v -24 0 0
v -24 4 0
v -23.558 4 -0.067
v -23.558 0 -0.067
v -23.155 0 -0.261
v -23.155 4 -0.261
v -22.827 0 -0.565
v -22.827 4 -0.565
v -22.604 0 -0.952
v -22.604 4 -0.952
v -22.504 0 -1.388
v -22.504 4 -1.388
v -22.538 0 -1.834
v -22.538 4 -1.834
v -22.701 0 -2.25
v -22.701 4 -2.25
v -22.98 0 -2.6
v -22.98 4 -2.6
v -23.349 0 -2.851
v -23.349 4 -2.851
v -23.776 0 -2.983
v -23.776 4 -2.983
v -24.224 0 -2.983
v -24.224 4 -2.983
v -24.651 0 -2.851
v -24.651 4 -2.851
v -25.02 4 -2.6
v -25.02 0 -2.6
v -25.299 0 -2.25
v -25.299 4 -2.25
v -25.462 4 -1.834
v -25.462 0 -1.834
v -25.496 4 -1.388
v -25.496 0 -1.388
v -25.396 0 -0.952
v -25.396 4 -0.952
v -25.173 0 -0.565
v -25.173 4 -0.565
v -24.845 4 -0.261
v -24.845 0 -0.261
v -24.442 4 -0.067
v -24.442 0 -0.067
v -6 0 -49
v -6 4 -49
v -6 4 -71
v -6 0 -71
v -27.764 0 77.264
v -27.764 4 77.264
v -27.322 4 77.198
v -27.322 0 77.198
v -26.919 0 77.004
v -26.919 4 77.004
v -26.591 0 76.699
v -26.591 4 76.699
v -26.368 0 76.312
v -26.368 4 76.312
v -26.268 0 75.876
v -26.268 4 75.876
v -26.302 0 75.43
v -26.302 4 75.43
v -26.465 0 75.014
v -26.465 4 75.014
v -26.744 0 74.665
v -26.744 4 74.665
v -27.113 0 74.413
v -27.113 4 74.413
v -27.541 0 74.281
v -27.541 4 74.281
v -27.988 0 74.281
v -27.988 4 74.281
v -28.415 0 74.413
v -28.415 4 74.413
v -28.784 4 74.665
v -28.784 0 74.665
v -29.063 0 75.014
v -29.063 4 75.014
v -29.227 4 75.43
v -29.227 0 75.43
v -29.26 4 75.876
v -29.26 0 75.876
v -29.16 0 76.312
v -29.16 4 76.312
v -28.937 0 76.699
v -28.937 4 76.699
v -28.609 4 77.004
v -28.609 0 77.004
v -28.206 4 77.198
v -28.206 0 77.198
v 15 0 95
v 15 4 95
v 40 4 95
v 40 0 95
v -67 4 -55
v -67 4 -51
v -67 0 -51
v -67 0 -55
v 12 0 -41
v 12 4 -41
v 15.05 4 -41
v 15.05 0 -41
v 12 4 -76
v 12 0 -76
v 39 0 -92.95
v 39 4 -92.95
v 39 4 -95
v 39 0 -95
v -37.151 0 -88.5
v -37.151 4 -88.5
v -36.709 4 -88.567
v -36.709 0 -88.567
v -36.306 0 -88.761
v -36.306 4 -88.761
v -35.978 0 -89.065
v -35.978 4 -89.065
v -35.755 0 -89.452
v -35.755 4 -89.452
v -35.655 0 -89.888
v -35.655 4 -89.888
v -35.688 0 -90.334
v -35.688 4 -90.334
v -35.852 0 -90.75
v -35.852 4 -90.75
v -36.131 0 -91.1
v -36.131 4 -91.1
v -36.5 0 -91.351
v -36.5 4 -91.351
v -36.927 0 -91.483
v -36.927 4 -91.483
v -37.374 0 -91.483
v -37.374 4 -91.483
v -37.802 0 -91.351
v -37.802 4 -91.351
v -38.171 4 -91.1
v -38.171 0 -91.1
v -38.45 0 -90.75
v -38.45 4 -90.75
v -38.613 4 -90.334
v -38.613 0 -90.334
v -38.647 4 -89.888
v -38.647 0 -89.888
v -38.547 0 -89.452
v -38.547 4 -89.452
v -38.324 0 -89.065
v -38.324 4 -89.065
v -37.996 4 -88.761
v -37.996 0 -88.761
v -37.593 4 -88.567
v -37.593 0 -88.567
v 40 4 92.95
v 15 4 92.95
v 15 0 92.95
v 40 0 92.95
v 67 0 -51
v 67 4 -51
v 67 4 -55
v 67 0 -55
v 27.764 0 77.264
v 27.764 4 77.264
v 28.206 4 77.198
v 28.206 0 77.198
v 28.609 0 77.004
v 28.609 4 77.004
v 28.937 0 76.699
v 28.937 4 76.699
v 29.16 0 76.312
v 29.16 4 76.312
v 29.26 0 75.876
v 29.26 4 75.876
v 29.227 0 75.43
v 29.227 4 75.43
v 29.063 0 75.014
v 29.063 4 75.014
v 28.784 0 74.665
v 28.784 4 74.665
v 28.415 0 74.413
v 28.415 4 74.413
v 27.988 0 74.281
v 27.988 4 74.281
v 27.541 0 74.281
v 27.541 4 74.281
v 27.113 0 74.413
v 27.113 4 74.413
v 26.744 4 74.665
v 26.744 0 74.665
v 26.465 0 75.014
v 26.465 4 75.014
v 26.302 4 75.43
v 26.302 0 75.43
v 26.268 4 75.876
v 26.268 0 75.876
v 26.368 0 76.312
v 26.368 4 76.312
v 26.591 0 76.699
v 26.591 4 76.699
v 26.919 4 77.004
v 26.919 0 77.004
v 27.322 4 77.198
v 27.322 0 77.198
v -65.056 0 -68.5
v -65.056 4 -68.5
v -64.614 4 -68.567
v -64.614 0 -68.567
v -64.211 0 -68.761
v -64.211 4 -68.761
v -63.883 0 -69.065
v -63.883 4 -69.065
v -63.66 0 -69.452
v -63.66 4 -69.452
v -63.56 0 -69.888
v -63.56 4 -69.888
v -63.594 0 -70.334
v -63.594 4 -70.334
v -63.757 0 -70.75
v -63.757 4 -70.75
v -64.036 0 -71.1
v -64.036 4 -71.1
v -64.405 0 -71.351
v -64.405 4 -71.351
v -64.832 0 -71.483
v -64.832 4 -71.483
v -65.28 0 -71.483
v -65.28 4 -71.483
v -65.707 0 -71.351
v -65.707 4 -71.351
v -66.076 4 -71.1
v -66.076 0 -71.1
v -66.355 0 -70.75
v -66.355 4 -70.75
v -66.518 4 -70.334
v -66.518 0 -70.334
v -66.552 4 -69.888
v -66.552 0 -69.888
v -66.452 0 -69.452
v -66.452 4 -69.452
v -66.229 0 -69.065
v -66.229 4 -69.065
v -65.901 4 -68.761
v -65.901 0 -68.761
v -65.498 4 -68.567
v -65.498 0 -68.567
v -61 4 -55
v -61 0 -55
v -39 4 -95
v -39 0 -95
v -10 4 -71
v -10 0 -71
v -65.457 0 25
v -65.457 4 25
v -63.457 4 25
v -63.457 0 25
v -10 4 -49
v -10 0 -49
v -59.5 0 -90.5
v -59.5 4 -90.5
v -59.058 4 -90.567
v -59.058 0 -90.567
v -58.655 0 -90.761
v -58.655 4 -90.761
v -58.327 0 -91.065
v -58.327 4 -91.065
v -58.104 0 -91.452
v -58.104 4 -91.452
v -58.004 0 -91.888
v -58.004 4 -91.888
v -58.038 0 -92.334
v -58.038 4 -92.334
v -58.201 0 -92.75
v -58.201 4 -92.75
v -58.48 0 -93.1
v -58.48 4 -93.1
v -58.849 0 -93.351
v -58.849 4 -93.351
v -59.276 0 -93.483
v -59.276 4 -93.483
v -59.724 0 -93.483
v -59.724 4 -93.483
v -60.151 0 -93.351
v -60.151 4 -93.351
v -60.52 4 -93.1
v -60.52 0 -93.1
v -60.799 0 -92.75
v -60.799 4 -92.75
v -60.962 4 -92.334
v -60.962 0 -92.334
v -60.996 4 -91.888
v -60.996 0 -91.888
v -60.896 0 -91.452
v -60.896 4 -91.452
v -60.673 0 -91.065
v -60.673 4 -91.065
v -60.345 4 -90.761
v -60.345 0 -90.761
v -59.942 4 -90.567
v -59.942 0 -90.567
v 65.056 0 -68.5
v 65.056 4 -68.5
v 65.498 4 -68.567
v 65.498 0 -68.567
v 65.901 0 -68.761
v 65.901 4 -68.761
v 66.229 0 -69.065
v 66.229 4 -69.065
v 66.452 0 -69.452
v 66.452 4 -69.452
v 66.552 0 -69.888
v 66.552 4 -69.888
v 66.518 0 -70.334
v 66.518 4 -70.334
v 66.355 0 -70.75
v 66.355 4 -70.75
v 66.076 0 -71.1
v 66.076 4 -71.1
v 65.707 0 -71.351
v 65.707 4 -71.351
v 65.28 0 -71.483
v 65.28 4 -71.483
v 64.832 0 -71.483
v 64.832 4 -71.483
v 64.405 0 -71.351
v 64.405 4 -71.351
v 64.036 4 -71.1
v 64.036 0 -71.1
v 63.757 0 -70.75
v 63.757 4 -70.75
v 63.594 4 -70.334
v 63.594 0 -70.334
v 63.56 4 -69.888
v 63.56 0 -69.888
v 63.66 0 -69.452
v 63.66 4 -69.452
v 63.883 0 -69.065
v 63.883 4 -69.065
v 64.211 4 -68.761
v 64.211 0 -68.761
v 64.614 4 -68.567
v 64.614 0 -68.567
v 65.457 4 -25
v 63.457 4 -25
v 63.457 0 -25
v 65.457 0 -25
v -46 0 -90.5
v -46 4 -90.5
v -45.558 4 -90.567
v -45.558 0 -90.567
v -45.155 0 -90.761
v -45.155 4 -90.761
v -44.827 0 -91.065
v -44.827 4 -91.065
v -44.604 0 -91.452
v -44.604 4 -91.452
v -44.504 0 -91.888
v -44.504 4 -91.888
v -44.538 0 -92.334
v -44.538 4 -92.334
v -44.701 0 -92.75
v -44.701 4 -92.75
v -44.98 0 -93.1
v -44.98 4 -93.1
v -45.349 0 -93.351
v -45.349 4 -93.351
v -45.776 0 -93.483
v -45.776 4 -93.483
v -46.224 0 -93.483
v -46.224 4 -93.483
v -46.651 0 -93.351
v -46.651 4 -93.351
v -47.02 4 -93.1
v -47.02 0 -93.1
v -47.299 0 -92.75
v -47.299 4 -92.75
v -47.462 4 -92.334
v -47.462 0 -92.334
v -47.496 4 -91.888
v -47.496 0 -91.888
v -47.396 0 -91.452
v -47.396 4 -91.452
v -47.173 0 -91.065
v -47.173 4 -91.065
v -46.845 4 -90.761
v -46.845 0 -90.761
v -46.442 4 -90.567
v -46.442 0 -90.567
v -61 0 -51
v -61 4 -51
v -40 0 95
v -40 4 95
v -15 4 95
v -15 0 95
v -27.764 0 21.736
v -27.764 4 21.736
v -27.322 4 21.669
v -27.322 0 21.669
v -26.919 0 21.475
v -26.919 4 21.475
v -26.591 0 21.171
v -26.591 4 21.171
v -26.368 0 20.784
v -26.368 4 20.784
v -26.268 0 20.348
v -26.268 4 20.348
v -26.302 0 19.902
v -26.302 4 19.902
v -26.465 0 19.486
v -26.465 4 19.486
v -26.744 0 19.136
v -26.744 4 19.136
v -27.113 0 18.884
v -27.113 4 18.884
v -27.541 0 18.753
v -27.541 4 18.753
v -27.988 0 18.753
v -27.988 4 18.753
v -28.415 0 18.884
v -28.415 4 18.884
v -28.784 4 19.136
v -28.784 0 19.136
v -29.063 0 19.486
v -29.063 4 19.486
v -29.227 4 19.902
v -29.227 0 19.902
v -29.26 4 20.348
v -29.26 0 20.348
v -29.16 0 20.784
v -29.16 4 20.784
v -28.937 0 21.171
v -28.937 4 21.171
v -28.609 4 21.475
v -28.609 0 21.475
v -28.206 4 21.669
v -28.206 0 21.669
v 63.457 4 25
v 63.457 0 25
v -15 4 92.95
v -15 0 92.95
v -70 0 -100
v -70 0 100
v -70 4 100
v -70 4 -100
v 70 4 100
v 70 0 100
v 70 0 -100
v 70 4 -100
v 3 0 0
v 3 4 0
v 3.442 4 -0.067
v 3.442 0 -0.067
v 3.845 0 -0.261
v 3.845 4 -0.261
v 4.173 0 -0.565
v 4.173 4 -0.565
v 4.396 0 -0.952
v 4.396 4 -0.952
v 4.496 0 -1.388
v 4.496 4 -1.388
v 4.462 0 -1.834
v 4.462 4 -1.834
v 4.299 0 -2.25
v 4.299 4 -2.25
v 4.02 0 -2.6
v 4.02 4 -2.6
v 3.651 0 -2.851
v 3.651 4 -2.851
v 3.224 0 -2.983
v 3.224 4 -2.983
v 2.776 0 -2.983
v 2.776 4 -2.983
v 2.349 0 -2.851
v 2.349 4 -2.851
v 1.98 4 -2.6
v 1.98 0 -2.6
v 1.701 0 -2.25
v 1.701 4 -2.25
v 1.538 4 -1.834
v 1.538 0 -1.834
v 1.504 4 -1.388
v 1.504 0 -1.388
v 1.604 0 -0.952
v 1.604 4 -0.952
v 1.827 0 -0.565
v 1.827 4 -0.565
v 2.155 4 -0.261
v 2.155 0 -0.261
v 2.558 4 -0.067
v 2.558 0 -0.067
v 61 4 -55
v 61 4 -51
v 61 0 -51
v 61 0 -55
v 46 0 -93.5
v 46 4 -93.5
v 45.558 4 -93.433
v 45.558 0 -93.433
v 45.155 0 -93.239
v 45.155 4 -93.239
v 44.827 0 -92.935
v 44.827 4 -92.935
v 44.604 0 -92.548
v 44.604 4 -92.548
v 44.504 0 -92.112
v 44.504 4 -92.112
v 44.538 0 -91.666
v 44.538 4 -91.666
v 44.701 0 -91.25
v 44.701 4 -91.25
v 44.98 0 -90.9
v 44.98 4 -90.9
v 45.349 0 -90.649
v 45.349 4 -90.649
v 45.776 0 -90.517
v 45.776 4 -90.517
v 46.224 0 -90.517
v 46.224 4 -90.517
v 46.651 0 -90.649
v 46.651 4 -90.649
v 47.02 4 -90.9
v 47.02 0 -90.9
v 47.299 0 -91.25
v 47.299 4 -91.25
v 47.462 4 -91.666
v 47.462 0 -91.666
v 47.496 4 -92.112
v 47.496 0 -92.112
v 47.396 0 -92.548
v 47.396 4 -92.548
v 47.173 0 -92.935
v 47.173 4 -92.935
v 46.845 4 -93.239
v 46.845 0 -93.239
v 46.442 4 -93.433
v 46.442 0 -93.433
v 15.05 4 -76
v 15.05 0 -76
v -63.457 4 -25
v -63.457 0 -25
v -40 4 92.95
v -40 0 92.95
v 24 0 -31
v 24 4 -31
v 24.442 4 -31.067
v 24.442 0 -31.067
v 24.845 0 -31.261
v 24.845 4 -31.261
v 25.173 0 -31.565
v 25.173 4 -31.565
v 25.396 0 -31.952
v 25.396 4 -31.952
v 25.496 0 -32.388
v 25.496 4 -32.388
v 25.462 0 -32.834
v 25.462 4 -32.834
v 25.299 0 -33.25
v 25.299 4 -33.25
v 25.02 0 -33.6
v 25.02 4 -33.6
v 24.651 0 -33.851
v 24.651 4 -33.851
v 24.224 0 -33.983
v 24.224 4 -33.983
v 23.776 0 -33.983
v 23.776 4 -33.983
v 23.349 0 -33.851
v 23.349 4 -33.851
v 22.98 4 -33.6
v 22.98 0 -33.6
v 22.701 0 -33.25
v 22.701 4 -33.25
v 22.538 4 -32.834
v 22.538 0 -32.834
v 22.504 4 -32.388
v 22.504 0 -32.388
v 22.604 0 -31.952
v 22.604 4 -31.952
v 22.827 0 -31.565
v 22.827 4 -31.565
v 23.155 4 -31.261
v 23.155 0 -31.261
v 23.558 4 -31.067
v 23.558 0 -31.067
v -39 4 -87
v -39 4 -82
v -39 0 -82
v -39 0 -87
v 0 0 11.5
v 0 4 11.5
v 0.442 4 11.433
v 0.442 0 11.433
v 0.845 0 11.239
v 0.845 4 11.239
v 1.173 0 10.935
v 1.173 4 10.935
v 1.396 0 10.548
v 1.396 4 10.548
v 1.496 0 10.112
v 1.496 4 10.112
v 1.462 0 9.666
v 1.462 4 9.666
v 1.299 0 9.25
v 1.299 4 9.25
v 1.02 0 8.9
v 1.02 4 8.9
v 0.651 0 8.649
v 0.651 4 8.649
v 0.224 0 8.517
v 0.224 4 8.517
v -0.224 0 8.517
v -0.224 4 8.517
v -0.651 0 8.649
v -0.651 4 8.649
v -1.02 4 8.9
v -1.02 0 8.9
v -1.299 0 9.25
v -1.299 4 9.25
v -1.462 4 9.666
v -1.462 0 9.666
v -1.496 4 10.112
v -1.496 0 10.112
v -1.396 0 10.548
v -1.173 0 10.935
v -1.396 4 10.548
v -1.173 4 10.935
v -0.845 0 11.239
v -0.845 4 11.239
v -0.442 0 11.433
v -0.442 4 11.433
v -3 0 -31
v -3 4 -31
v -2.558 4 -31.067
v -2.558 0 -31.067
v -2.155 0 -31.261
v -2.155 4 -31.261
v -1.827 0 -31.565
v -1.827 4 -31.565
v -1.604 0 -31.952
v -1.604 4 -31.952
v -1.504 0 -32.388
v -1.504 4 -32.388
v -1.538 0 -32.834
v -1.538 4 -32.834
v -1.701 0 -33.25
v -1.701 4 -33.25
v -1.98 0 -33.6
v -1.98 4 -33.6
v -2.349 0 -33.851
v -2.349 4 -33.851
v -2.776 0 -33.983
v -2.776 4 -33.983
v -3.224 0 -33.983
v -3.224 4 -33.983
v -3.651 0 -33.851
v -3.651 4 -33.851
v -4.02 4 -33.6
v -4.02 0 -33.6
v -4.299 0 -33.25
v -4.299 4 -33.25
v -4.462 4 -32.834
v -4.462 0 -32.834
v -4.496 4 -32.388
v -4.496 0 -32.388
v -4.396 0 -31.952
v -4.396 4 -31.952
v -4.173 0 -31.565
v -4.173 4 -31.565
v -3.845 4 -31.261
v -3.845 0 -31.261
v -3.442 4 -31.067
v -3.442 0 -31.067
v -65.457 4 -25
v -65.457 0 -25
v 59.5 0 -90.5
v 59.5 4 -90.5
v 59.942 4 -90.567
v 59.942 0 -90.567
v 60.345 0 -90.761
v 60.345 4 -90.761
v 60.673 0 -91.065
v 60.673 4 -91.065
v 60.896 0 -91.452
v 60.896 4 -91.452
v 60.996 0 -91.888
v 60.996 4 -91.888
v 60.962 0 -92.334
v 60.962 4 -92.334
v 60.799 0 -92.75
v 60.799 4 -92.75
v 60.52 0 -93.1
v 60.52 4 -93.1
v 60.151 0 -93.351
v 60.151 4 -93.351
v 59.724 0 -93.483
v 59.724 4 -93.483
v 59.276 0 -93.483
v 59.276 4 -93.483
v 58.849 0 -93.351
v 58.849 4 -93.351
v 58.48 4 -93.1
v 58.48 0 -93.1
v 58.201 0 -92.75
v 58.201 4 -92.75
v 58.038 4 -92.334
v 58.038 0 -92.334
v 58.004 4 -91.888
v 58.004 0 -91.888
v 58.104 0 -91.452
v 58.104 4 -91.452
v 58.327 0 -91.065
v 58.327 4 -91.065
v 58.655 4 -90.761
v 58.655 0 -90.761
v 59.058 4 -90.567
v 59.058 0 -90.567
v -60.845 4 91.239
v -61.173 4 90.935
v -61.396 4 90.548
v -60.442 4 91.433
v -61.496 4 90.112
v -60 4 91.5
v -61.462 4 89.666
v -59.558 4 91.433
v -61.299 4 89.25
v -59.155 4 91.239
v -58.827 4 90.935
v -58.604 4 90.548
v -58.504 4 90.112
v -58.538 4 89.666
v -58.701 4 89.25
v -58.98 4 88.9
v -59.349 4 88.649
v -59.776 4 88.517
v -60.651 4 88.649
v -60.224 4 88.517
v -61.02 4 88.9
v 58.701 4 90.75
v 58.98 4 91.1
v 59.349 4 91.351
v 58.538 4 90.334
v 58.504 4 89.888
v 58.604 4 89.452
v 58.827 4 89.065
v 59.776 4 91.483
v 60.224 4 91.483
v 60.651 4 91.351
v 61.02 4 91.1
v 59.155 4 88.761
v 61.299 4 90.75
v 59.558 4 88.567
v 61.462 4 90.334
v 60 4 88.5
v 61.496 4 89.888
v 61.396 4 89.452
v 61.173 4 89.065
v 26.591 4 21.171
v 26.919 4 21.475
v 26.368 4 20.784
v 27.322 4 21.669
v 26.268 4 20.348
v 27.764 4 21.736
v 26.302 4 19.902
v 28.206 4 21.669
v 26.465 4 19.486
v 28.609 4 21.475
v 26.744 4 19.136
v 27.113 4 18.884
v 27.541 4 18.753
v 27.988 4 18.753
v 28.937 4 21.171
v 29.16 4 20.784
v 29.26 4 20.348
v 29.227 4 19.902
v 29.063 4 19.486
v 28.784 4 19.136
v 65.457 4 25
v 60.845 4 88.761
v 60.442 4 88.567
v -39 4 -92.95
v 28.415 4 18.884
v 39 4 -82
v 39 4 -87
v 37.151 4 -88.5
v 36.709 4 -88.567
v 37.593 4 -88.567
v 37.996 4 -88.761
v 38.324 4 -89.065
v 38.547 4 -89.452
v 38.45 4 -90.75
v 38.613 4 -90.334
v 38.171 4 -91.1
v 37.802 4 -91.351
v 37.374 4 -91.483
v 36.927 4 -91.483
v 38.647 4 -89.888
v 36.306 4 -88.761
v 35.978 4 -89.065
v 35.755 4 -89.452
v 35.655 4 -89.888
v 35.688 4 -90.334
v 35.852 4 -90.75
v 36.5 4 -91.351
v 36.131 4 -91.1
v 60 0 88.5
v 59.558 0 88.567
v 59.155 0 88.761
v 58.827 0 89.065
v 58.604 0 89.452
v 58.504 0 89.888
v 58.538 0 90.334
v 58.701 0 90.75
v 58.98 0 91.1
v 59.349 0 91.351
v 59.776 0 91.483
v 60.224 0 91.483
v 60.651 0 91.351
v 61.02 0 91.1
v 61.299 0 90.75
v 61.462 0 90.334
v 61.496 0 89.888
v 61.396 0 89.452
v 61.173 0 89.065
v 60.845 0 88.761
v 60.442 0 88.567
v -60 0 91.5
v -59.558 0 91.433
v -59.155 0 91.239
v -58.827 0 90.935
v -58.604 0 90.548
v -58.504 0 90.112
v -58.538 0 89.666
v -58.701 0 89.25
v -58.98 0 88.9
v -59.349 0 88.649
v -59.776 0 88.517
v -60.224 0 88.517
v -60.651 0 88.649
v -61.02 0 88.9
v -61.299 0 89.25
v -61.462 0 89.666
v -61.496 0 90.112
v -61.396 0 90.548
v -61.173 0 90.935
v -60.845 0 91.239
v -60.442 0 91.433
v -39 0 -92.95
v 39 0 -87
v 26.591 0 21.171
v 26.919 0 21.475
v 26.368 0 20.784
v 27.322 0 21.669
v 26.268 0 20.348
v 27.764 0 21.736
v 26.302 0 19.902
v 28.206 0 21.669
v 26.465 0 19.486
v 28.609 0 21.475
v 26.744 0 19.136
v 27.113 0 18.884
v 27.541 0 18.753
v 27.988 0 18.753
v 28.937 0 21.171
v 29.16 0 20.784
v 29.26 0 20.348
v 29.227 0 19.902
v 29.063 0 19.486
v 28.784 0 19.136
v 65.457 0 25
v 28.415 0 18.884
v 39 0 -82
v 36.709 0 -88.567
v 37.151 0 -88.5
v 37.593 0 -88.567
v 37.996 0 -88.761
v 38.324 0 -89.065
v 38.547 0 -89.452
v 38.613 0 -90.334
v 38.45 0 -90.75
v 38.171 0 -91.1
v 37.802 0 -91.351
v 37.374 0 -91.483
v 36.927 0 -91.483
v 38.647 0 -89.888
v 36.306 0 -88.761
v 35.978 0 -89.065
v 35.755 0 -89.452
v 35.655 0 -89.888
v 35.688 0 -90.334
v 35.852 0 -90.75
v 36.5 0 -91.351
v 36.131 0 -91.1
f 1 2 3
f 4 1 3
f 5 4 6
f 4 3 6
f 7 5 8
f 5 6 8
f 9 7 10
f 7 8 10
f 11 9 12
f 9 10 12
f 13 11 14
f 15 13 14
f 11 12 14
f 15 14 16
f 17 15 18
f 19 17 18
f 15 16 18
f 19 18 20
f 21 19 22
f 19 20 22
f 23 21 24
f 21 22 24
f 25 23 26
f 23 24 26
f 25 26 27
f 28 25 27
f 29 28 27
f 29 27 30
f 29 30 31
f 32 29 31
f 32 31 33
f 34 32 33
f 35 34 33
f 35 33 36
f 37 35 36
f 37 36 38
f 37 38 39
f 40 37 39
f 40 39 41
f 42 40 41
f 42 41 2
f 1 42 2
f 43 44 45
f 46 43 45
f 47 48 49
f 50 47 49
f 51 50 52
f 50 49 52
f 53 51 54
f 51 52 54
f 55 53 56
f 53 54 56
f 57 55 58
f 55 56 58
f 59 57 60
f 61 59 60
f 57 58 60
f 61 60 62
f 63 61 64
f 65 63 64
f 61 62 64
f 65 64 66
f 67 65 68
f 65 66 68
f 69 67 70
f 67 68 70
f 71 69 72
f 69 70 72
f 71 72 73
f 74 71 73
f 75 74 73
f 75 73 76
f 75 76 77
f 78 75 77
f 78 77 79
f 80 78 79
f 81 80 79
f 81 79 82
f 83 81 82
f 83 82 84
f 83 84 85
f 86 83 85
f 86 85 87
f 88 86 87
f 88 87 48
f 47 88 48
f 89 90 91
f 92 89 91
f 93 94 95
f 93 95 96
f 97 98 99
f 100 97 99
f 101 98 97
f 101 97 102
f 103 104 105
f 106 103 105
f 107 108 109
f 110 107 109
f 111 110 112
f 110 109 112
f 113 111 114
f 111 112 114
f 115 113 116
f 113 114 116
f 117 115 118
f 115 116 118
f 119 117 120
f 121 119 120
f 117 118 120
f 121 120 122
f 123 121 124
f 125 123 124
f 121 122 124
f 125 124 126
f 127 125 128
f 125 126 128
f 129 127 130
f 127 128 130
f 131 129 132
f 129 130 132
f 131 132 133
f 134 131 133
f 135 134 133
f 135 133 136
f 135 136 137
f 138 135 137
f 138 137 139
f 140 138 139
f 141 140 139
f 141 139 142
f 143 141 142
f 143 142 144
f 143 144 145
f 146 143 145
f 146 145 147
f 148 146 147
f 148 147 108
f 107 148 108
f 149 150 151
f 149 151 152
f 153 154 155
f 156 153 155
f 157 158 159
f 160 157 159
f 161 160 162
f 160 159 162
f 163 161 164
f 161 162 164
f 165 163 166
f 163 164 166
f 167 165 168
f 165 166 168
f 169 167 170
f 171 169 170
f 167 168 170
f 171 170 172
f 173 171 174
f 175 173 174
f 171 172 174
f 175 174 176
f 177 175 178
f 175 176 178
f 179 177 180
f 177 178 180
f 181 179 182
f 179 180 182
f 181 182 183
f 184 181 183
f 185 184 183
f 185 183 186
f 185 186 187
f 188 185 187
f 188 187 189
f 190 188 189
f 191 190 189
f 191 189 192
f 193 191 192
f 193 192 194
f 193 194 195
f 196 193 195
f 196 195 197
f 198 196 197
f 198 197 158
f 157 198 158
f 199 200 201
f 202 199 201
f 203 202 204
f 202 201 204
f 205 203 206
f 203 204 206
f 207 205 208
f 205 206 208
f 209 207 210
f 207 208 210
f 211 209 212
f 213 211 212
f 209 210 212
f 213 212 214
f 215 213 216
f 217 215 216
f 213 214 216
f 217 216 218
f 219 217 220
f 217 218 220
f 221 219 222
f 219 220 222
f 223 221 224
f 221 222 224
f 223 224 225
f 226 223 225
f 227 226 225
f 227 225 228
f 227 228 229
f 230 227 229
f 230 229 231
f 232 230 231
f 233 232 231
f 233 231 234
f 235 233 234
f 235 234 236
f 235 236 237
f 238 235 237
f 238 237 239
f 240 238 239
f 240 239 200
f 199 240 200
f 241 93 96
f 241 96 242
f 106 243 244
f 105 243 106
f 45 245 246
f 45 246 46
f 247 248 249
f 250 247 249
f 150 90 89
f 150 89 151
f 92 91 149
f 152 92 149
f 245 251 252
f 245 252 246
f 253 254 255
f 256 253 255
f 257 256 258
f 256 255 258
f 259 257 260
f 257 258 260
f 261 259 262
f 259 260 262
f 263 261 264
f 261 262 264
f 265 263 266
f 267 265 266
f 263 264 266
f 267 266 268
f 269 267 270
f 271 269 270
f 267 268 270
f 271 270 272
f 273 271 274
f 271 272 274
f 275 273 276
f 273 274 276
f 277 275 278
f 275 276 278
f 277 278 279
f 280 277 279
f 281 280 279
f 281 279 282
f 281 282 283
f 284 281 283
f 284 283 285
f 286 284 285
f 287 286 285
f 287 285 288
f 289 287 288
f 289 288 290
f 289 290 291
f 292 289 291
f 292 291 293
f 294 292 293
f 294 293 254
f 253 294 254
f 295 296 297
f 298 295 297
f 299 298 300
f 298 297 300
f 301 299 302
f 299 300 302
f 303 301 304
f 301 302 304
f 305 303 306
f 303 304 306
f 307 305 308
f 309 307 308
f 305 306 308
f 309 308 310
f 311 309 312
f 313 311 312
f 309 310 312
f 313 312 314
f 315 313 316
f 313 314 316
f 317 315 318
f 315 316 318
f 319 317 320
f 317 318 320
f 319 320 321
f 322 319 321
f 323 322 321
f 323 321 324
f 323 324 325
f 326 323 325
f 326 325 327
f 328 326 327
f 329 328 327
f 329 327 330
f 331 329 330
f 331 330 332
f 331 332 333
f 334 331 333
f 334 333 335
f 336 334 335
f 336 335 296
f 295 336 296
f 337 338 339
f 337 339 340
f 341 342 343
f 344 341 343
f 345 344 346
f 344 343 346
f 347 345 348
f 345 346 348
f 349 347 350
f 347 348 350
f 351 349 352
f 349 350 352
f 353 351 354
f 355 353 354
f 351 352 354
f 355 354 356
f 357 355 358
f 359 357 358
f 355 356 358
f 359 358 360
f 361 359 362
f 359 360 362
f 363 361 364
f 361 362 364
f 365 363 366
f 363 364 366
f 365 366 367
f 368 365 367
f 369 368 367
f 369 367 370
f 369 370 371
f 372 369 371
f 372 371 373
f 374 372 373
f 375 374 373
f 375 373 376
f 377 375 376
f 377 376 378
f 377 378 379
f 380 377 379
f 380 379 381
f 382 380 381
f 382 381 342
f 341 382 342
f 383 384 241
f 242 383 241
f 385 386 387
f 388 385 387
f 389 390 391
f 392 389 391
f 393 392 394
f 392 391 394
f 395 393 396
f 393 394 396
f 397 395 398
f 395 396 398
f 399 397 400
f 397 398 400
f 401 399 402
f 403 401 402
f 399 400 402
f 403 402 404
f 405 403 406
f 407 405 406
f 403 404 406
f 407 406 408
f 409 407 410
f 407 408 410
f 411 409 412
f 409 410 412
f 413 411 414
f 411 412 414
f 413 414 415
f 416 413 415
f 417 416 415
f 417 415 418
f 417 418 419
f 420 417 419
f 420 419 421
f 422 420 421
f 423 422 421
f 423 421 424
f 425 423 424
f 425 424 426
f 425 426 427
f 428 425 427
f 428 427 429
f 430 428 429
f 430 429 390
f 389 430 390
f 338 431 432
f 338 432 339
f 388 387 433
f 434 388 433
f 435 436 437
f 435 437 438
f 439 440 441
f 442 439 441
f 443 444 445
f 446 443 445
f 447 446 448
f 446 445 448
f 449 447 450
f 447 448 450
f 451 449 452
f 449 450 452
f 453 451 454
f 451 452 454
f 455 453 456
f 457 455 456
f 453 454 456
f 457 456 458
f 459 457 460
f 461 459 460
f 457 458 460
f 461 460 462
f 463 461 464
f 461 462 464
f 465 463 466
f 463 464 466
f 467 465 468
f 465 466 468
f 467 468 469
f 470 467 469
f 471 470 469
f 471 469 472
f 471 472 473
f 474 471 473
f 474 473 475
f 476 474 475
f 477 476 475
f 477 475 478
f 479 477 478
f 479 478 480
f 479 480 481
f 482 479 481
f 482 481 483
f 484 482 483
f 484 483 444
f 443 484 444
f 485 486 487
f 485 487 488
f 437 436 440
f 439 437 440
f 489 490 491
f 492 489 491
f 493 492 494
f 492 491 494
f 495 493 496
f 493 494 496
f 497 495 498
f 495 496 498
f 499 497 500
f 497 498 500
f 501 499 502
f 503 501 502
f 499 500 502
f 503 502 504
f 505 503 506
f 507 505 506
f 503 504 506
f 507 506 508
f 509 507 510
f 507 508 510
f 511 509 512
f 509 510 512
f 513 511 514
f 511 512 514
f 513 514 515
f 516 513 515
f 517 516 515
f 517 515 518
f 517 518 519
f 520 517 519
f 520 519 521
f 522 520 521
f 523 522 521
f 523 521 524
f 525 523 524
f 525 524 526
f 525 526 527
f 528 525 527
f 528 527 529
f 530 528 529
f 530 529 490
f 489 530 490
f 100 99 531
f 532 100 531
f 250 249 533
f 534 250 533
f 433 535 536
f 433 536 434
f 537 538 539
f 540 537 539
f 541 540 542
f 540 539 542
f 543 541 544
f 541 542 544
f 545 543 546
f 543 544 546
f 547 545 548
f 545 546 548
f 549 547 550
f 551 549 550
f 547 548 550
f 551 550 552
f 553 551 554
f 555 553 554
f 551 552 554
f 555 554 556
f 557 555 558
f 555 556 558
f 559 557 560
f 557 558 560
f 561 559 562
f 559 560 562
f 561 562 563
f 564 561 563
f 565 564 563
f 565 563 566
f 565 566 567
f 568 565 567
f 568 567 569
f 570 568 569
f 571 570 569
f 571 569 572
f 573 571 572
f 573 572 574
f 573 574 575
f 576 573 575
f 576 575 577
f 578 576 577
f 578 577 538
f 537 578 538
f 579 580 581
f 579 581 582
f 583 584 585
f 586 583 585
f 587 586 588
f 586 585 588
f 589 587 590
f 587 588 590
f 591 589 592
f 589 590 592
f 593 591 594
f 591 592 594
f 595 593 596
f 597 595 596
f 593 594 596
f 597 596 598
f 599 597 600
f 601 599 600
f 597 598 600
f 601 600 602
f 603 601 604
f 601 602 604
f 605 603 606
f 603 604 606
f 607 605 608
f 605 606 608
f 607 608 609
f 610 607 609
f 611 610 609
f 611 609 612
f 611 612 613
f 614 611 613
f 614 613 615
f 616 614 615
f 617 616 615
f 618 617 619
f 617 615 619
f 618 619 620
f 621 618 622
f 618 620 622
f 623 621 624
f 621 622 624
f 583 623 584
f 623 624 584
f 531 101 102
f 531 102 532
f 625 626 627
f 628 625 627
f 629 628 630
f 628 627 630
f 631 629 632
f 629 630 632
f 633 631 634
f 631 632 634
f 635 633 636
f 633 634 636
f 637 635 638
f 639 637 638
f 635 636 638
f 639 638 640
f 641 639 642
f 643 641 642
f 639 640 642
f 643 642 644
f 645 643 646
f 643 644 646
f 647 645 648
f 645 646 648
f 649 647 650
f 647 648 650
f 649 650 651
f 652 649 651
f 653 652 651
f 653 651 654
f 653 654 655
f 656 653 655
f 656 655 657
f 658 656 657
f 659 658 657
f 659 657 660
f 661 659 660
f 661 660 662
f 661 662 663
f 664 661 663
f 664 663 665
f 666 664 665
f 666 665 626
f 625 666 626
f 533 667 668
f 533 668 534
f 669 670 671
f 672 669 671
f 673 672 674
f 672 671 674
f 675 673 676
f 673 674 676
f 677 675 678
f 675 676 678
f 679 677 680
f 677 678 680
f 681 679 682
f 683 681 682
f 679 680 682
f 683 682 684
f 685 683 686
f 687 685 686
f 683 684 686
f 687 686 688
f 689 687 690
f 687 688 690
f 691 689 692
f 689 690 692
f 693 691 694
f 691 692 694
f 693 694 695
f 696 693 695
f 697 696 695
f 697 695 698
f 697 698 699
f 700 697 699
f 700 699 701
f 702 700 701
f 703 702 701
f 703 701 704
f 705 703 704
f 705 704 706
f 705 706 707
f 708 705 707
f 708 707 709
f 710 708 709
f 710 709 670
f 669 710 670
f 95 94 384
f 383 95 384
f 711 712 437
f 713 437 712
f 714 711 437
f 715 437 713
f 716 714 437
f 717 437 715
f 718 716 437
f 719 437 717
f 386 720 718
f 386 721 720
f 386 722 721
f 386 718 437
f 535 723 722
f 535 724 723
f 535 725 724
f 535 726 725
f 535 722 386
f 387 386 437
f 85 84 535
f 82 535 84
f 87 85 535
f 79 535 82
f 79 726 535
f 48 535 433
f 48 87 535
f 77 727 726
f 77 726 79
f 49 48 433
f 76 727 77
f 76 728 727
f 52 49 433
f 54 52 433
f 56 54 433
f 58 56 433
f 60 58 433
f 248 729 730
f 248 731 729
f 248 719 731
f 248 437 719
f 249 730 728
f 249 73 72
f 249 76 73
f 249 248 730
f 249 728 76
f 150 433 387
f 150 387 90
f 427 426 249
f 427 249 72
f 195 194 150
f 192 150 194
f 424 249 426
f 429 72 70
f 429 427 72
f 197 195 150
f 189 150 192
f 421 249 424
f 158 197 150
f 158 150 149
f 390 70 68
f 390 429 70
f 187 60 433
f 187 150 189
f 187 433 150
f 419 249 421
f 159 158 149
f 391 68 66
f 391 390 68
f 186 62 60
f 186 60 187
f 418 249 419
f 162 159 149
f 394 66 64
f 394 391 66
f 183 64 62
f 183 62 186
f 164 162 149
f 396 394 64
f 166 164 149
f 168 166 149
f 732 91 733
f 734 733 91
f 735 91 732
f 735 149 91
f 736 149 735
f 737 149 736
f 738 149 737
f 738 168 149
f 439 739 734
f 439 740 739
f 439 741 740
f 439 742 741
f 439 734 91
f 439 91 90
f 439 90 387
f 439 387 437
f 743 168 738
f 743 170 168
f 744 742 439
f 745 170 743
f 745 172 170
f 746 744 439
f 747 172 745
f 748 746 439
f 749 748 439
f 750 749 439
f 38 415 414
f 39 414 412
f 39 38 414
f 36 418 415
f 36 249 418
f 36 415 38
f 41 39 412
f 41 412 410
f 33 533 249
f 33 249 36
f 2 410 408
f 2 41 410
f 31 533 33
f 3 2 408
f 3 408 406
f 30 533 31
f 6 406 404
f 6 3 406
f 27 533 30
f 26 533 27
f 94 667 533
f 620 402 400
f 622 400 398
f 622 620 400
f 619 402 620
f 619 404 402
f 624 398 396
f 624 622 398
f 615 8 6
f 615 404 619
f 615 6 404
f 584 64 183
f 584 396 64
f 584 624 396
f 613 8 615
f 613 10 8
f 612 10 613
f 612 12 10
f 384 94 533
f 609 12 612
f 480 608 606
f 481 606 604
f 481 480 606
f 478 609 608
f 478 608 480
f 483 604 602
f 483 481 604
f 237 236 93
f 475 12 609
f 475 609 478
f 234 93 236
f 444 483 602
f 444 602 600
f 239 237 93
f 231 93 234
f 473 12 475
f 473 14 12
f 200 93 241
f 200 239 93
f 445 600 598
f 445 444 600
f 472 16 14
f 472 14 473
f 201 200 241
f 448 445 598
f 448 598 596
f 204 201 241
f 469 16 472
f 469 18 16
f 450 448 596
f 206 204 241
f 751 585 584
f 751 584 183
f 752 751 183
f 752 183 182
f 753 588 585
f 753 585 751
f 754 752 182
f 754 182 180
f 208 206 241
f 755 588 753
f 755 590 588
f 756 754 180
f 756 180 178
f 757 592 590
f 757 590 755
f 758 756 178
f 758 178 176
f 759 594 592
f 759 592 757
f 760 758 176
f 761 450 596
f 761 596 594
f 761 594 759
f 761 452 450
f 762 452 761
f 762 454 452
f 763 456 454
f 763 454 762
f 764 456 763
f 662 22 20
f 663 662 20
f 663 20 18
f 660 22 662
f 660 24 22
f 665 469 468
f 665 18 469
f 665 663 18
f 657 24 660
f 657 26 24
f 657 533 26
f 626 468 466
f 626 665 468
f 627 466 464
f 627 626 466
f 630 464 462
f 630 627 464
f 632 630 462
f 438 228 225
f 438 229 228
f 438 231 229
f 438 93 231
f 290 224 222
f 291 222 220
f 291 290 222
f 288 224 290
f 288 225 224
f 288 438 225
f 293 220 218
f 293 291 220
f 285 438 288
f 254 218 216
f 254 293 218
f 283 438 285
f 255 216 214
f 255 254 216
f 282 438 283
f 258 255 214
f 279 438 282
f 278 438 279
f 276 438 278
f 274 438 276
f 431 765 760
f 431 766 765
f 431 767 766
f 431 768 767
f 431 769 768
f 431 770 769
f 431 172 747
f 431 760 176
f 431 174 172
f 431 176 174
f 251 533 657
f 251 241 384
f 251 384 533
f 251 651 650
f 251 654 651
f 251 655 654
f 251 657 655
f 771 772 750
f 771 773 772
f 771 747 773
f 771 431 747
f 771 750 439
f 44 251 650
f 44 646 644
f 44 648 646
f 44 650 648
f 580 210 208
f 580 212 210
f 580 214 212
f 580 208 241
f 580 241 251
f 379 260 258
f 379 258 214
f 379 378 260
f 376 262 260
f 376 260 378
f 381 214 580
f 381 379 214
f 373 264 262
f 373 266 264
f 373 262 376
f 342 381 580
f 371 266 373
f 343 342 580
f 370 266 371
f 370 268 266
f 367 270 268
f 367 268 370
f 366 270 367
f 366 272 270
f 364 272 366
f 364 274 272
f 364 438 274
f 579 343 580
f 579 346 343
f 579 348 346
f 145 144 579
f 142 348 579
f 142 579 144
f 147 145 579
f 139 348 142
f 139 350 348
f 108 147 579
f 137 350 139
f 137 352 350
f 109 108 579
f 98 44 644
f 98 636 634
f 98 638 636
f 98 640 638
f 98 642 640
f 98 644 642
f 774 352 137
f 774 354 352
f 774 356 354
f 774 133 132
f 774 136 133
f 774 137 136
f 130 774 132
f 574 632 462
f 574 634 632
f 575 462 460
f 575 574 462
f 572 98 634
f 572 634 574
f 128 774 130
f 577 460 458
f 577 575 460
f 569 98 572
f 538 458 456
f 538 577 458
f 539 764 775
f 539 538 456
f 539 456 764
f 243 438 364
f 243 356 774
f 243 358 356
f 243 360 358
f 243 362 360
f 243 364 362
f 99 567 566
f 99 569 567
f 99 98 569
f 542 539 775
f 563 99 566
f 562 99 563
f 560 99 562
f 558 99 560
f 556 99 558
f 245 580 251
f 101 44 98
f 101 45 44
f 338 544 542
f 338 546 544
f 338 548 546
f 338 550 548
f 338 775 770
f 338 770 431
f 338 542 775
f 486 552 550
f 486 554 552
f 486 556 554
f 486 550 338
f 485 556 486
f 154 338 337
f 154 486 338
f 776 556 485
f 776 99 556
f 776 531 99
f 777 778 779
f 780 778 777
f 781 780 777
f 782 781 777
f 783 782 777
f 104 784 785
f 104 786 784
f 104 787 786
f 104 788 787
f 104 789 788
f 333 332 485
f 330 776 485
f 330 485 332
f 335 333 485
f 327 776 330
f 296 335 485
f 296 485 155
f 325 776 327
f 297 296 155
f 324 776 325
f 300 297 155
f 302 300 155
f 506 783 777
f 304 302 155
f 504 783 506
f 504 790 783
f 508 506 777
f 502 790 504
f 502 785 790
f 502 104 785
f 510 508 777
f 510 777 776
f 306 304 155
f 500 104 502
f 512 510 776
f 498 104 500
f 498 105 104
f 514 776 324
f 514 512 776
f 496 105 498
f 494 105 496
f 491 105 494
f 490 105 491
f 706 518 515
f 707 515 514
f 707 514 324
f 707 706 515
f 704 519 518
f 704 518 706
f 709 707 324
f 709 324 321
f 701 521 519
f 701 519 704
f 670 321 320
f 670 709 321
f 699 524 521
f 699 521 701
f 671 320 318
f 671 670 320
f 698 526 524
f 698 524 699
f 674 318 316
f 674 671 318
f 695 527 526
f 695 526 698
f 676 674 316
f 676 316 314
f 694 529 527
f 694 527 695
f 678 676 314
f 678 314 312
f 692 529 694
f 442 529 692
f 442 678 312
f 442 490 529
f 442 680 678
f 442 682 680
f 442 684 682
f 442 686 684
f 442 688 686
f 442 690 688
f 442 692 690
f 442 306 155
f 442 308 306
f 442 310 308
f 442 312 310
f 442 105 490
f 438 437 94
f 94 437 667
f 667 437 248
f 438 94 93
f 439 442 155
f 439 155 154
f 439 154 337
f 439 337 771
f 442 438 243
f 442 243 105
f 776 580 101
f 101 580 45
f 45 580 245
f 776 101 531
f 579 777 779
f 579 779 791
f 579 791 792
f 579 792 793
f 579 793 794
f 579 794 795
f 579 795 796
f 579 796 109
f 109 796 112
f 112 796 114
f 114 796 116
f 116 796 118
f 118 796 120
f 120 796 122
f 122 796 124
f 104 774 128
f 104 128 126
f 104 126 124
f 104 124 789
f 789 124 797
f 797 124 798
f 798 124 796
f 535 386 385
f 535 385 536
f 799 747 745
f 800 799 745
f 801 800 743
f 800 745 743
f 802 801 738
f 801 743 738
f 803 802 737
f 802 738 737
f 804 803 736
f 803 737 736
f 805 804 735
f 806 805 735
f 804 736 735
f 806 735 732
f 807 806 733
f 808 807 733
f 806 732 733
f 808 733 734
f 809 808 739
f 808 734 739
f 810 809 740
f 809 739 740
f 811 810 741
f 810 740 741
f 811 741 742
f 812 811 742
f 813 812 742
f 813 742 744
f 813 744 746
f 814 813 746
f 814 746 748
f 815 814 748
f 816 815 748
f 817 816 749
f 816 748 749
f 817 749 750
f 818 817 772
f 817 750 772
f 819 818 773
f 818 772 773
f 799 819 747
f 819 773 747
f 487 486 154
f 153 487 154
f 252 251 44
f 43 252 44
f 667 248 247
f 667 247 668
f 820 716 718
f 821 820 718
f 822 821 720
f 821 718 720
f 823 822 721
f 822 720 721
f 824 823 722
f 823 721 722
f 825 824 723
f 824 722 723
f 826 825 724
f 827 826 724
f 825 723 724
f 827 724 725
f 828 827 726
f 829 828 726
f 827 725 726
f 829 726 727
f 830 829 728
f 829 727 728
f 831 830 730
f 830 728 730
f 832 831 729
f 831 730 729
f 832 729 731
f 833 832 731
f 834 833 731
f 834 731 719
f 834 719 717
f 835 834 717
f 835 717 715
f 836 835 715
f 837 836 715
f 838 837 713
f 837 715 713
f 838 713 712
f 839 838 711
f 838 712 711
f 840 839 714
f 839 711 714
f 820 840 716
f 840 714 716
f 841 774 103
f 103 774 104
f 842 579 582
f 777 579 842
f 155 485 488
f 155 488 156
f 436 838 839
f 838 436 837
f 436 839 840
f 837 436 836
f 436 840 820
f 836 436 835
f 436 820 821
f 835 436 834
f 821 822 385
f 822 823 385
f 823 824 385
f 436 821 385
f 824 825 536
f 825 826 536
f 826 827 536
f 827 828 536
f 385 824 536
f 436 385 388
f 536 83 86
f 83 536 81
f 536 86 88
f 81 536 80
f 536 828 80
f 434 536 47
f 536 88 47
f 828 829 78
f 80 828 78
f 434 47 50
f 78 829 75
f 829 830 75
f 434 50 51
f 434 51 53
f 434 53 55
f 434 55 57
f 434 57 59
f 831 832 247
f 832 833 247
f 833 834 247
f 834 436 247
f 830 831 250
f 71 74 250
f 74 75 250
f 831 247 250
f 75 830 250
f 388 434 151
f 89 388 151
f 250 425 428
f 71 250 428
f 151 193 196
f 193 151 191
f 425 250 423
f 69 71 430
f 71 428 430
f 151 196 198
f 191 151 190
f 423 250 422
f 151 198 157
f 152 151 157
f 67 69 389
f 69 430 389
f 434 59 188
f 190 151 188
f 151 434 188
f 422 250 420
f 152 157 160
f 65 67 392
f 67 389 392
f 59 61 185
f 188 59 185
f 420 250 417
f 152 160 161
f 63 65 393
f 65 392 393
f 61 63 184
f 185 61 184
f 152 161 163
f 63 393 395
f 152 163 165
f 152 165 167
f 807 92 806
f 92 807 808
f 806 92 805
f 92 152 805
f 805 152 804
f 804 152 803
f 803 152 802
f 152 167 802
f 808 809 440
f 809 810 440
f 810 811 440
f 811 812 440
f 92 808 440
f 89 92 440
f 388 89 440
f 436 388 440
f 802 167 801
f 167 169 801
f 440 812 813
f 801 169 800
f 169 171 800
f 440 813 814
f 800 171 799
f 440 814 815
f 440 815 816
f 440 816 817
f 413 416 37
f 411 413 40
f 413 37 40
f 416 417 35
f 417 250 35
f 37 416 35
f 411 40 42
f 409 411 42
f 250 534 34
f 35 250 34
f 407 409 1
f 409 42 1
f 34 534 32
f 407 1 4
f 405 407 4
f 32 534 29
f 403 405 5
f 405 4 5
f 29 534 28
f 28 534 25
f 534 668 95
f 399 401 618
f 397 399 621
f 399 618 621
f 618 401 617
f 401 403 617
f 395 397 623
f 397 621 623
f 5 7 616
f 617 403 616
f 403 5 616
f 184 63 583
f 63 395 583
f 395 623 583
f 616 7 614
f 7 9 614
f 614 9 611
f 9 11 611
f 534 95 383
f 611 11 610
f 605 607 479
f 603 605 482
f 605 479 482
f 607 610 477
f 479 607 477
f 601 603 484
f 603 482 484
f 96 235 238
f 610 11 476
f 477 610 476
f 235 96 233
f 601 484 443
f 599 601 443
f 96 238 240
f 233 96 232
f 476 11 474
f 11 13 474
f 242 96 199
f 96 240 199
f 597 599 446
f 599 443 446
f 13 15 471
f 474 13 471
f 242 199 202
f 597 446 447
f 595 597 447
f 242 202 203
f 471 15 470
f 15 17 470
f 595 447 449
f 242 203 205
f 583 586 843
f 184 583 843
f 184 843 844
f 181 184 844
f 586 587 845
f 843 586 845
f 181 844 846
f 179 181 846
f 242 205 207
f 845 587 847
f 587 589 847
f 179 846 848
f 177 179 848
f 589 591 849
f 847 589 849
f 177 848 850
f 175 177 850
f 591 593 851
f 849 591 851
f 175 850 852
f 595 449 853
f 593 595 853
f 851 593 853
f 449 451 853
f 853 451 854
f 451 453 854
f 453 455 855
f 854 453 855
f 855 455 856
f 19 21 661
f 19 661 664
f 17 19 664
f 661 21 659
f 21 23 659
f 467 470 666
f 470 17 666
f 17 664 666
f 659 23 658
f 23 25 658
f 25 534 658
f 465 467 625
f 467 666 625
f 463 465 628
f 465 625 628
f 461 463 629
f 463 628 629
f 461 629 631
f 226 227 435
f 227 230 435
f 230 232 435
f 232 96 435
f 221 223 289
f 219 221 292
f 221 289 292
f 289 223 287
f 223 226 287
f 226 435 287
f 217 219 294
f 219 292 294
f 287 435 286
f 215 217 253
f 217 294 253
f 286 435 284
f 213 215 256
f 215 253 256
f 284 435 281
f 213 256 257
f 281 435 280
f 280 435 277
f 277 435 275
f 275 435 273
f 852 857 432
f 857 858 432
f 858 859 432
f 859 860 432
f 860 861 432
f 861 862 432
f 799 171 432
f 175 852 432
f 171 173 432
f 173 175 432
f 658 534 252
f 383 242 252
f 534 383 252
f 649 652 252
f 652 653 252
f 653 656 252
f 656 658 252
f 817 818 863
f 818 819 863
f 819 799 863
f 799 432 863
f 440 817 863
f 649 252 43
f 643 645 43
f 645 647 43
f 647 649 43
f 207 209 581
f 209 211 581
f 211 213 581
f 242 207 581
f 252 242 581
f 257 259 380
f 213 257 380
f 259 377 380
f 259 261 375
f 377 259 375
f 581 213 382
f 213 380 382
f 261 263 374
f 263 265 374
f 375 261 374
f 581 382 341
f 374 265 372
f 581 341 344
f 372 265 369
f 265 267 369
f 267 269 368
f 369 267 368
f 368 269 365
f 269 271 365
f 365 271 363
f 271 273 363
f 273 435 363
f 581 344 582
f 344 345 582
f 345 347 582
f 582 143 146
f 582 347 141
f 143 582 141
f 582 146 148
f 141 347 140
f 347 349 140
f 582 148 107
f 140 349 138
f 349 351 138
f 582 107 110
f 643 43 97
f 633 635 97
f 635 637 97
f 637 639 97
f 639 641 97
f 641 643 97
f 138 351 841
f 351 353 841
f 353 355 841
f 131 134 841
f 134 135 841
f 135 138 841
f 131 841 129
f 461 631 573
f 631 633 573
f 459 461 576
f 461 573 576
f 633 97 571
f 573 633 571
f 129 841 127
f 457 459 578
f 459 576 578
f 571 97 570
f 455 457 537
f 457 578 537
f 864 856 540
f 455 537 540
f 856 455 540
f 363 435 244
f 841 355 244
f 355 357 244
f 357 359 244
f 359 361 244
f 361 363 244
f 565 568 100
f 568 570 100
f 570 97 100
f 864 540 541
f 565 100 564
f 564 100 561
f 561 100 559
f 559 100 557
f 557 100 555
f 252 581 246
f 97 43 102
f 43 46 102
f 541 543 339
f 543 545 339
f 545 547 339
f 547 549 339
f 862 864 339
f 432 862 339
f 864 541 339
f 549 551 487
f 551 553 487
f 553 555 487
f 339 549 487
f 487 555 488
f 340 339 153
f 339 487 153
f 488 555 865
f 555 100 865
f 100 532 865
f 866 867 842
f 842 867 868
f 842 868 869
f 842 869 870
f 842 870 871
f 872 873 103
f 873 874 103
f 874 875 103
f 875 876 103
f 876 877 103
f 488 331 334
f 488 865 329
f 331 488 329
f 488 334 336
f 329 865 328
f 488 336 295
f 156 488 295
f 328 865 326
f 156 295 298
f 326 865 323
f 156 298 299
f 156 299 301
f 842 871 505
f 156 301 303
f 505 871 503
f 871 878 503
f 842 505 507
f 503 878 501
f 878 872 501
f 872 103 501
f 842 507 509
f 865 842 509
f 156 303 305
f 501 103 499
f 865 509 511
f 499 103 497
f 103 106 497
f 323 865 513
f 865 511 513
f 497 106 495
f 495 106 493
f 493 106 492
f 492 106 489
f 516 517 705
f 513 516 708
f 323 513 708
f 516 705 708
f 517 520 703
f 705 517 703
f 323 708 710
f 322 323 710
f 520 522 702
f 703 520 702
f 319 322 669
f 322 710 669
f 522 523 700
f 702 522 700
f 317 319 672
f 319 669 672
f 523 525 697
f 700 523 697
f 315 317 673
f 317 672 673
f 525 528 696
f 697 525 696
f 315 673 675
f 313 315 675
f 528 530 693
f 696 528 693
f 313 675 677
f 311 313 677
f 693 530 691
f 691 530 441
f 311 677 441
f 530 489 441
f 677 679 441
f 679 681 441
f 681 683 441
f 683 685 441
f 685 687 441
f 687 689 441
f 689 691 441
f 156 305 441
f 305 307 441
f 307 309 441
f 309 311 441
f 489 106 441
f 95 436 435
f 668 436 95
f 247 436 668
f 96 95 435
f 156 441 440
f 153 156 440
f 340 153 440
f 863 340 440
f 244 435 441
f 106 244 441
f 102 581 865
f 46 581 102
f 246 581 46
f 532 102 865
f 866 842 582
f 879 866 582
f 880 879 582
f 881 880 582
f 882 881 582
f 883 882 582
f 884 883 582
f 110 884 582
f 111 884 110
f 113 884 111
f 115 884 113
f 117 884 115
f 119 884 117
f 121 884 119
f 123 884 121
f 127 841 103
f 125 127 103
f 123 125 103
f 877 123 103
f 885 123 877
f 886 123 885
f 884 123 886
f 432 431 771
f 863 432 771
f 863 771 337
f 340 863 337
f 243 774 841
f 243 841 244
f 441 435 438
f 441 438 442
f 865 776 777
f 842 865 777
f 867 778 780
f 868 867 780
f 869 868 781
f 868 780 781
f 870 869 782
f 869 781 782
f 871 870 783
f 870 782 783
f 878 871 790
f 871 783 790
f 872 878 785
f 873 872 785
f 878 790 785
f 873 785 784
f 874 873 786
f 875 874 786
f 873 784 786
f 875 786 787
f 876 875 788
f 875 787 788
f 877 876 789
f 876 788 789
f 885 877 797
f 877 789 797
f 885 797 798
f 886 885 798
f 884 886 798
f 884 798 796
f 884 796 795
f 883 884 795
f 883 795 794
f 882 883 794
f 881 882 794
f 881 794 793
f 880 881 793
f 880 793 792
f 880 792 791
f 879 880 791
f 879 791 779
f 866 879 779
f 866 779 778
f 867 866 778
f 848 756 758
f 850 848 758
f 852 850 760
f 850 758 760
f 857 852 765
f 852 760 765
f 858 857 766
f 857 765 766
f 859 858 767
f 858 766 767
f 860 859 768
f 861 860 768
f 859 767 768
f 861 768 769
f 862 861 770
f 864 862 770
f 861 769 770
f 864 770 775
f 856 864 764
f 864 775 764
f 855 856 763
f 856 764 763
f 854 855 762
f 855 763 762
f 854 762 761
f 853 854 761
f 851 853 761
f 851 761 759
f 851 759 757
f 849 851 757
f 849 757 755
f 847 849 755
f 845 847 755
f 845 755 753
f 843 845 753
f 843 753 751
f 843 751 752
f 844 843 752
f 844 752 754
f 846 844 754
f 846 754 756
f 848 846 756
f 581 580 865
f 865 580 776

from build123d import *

# Parameters (mm, degrees)
SKETCH1_W           = 140
SKETCH1_H           = 200
BOSS_EXTRUDE1_DEPTH = 4
SKETCH2_W           = 78
SKETCH2_H           = 2.05
SKETCH2_R           = 1.5
SKETCH2_H_2         = 5
CUT_EXTRUDE3_DEPTH  = 123.131077126
SKETCH3_W           = 6
SKETCH3_H           = 4
SKETCH3_R           = 1.5
CUT_EXTRUDE5_DEPTH  = 123.131077126
SKETCH4_R           = 1.5
CUT_EXTRUDE6_DEPTH  = 123.131077126
SKETCH6_W           = 3.05
SKETCH6_H           = 35
SKETCH6_W_2         = 4
SKETCH6_H_2         = 22
CUT_EXTRUDE13_DEPTH = 4
SKETCH7_R           = 1.5
CUT_EXTRUDE15_DEPTH = 123.131077126
SKETCH8_R           = 1.5
SKETCH8_W           = 2
SKETCH8_H           = 50
SKETCH8_W_2         = 25
SKETCH8_H_2         = 2.05
CUT_EXTRUDE16_DEPTH = 4


with BuildPart() as part:
    # Sketch1 → Boss-Extrude1 (new body)
    with BuildSketch(Plane(origin=(0, 0, 0), x_dir=(1, 0, 0), z_dir=(0, 1, 0))):
        Rectangle(SKETCH1_W, SKETCH1_H)
    extrude(amount=BOSS_EXTRUDE1_DEPTH)

    # Sketch2 → Cut-Extrude3 (cut, through all)
    with BuildSketch(Plane(origin=(0, 4, 0), x_dir=(1, 0, 0), z_dir=(0, 1, 0))):
        with Locations((0, 93.975)):
            Rectangle(SKETCH2_W, SKETCH2_H)
        with Locations(Location((-37.150844364, 90, 0), (0, 0, 270))):
            Circle(SKETCH2_R)
        with Locations(Location((37.150844364, 90, 0), (0, 0, 270))):
            Circle(SKETCH2_R)
        with Locations((0, 84.5)):
            Rectangle(SKETCH2_W, SKETCH2_H_2)
    extrude(amount=-CUT_EXTRUDE3_DEPTH, mode=Mode.SUBTRACT)

    # Sketch3 → Cut-Extrude5 (cut, through all)
    with BuildSketch(Plane(origin=(0, 4, 0), x_dir=(1, 0, 0), z_dir=(0, 1, 0))):
        with Locations((-64, 53)):
            Rectangle(SKETCH3_W, SKETCH3_H)
        with Locations(Location((65.055984274, 70, 0), (0, 0, 270))):
            Circle(SKETCH3_R)
        with Locations((64, 53)):
            Rectangle(SKETCH3_W, SKETCH3_H)
        with Locations(Location((-65.055984274, 70, 0), (0, 0, 270))):
            Circle(SKETCH3_R)
    extrude(amount=-CUT_EXTRUDE5_DEPTH, mode=Mode.SUBTRACT)

    # Sketch4 → Cut-Extrude6 (cut, through all)
    with BuildSketch(Plane(origin=(0, 4, 0), x_dir=(1, 0, 0), z_dir=(0, 1, 0))):
        with Locations(Location((59.5, 92, 0), (0, 0, 270))):
            Circle(SKETCH4_R)
        with Locations(Location((-59.5, 92, 0), (0, 0, 270))):
            Circle(SKETCH4_R)
        with Locations(Location((-46, 92, 0), (0, 0, 270))):
            Circle(SKETCH4_R)
        with Locations(Location((46, 92, 0), (0, 0, 90))):
            Circle(SKETCH4_R)
    extrude(amount=-CUT_EXTRUDE6_DEPTH, mode=Mode.SUBTRACT)

    # Sketch6 → Cut-Extrude13 (cut)
    with BuildSketch(Plane(origin=(0, 4, 0), x_dir=(1, 0, 0), z_dir=(0, 1, 0))):
        with Locations((13.525, 58.5)):
            Rectangle(SKETCH6_W, SKETCH6_H)
        with Locations((-8, 60)):
            Rectangle(SKETCH6_W_2, SKETCH6_H_2)
    extrude(amount=-CUT_EXTRUDE13_DEPTH, mode=Mode.SUBTRACT)

    # Sketch7 → Cut-Extrude15 (cut, through all)
    with BuildSketch(Plane(origin=(0, 4, 0), x_dir=(1, 0, 0), z_dir=(0, 1, 0))):
        with Locations(Location((27.764169226, -20.235830774, 0), (0, 0, 270))):
            Circle(SKETCH7_R)
        with Locations(Location((-27.764169226, -75.764169226, 0), (0, 0, 270))):
            Circle(SKETCH7_R)
        with Locations(Location((27.764169226, -75.764169226, 0), (0, 0, 270))):
            Circle(SKETCH7_R)
        with Locations(Location((24, 32.5, 0), (0, 0, 270))):
            Circle(SKETCH7_R)
        with Locations(Location((3, 1.5, 0), (0, 0, 270))):
            Circle(SKETCH7_R)
        with Locations(Location((-24, 1.5, 0), (0, 0, 270))):
            Circle(SKETCH7_R)
        with Locations(Location((-3, 32.5, 0), (0, 0, 270))):
            Circle(SKETCH7_R)
        with Locations(Location((-27.764169226, -20.235830774, 0), (0, 0, 270))):
            Circle(SKETCH7_R)
    extrude(amount=-CUT_EXTRUDE15_DEPTH, mode=Mode.SUBTRACT)

    # Sketch8 → Cut-Extrude16 (cut)
    with BuildSketch(Plane(origin=(0, 4, 0), x_dir=(1, 0, 0), z_dir=(0, 1, 0))):
        with Locations(Location((0, -10, 0), (0, 0, 270))):
            Circle(SKETCH8_R)
        with Locations(Location((-60, -90, 0), (0, 0, 270))):
            Circle(SKETCH8_R)
        with Locations(Location((60, -90, 0), (0, 0, 90))):
            Circle(SKETCH8_R)
        with Locations((-64.456694017, 0)):
            Rectangle(SKETCH8_W, SKETCH8_H)
        with Locations((64.456694017, 0)):
            Rectangle(SKETCH8_W, SKETCH8_H)
        with Locations((27.5, -93.975)):
            Rectangle(SKETCH8_W_2, SKETCH8_H_2)
        with Locations((-27.5, -93.975)):
            Rectangle(SKETCH8_W_2, SKETCH8_H_2)
    extrude(amount=-CUT_EXTRUDE16_DEPTH, mode=Mode.SUBTRACT)


solid = part.part
